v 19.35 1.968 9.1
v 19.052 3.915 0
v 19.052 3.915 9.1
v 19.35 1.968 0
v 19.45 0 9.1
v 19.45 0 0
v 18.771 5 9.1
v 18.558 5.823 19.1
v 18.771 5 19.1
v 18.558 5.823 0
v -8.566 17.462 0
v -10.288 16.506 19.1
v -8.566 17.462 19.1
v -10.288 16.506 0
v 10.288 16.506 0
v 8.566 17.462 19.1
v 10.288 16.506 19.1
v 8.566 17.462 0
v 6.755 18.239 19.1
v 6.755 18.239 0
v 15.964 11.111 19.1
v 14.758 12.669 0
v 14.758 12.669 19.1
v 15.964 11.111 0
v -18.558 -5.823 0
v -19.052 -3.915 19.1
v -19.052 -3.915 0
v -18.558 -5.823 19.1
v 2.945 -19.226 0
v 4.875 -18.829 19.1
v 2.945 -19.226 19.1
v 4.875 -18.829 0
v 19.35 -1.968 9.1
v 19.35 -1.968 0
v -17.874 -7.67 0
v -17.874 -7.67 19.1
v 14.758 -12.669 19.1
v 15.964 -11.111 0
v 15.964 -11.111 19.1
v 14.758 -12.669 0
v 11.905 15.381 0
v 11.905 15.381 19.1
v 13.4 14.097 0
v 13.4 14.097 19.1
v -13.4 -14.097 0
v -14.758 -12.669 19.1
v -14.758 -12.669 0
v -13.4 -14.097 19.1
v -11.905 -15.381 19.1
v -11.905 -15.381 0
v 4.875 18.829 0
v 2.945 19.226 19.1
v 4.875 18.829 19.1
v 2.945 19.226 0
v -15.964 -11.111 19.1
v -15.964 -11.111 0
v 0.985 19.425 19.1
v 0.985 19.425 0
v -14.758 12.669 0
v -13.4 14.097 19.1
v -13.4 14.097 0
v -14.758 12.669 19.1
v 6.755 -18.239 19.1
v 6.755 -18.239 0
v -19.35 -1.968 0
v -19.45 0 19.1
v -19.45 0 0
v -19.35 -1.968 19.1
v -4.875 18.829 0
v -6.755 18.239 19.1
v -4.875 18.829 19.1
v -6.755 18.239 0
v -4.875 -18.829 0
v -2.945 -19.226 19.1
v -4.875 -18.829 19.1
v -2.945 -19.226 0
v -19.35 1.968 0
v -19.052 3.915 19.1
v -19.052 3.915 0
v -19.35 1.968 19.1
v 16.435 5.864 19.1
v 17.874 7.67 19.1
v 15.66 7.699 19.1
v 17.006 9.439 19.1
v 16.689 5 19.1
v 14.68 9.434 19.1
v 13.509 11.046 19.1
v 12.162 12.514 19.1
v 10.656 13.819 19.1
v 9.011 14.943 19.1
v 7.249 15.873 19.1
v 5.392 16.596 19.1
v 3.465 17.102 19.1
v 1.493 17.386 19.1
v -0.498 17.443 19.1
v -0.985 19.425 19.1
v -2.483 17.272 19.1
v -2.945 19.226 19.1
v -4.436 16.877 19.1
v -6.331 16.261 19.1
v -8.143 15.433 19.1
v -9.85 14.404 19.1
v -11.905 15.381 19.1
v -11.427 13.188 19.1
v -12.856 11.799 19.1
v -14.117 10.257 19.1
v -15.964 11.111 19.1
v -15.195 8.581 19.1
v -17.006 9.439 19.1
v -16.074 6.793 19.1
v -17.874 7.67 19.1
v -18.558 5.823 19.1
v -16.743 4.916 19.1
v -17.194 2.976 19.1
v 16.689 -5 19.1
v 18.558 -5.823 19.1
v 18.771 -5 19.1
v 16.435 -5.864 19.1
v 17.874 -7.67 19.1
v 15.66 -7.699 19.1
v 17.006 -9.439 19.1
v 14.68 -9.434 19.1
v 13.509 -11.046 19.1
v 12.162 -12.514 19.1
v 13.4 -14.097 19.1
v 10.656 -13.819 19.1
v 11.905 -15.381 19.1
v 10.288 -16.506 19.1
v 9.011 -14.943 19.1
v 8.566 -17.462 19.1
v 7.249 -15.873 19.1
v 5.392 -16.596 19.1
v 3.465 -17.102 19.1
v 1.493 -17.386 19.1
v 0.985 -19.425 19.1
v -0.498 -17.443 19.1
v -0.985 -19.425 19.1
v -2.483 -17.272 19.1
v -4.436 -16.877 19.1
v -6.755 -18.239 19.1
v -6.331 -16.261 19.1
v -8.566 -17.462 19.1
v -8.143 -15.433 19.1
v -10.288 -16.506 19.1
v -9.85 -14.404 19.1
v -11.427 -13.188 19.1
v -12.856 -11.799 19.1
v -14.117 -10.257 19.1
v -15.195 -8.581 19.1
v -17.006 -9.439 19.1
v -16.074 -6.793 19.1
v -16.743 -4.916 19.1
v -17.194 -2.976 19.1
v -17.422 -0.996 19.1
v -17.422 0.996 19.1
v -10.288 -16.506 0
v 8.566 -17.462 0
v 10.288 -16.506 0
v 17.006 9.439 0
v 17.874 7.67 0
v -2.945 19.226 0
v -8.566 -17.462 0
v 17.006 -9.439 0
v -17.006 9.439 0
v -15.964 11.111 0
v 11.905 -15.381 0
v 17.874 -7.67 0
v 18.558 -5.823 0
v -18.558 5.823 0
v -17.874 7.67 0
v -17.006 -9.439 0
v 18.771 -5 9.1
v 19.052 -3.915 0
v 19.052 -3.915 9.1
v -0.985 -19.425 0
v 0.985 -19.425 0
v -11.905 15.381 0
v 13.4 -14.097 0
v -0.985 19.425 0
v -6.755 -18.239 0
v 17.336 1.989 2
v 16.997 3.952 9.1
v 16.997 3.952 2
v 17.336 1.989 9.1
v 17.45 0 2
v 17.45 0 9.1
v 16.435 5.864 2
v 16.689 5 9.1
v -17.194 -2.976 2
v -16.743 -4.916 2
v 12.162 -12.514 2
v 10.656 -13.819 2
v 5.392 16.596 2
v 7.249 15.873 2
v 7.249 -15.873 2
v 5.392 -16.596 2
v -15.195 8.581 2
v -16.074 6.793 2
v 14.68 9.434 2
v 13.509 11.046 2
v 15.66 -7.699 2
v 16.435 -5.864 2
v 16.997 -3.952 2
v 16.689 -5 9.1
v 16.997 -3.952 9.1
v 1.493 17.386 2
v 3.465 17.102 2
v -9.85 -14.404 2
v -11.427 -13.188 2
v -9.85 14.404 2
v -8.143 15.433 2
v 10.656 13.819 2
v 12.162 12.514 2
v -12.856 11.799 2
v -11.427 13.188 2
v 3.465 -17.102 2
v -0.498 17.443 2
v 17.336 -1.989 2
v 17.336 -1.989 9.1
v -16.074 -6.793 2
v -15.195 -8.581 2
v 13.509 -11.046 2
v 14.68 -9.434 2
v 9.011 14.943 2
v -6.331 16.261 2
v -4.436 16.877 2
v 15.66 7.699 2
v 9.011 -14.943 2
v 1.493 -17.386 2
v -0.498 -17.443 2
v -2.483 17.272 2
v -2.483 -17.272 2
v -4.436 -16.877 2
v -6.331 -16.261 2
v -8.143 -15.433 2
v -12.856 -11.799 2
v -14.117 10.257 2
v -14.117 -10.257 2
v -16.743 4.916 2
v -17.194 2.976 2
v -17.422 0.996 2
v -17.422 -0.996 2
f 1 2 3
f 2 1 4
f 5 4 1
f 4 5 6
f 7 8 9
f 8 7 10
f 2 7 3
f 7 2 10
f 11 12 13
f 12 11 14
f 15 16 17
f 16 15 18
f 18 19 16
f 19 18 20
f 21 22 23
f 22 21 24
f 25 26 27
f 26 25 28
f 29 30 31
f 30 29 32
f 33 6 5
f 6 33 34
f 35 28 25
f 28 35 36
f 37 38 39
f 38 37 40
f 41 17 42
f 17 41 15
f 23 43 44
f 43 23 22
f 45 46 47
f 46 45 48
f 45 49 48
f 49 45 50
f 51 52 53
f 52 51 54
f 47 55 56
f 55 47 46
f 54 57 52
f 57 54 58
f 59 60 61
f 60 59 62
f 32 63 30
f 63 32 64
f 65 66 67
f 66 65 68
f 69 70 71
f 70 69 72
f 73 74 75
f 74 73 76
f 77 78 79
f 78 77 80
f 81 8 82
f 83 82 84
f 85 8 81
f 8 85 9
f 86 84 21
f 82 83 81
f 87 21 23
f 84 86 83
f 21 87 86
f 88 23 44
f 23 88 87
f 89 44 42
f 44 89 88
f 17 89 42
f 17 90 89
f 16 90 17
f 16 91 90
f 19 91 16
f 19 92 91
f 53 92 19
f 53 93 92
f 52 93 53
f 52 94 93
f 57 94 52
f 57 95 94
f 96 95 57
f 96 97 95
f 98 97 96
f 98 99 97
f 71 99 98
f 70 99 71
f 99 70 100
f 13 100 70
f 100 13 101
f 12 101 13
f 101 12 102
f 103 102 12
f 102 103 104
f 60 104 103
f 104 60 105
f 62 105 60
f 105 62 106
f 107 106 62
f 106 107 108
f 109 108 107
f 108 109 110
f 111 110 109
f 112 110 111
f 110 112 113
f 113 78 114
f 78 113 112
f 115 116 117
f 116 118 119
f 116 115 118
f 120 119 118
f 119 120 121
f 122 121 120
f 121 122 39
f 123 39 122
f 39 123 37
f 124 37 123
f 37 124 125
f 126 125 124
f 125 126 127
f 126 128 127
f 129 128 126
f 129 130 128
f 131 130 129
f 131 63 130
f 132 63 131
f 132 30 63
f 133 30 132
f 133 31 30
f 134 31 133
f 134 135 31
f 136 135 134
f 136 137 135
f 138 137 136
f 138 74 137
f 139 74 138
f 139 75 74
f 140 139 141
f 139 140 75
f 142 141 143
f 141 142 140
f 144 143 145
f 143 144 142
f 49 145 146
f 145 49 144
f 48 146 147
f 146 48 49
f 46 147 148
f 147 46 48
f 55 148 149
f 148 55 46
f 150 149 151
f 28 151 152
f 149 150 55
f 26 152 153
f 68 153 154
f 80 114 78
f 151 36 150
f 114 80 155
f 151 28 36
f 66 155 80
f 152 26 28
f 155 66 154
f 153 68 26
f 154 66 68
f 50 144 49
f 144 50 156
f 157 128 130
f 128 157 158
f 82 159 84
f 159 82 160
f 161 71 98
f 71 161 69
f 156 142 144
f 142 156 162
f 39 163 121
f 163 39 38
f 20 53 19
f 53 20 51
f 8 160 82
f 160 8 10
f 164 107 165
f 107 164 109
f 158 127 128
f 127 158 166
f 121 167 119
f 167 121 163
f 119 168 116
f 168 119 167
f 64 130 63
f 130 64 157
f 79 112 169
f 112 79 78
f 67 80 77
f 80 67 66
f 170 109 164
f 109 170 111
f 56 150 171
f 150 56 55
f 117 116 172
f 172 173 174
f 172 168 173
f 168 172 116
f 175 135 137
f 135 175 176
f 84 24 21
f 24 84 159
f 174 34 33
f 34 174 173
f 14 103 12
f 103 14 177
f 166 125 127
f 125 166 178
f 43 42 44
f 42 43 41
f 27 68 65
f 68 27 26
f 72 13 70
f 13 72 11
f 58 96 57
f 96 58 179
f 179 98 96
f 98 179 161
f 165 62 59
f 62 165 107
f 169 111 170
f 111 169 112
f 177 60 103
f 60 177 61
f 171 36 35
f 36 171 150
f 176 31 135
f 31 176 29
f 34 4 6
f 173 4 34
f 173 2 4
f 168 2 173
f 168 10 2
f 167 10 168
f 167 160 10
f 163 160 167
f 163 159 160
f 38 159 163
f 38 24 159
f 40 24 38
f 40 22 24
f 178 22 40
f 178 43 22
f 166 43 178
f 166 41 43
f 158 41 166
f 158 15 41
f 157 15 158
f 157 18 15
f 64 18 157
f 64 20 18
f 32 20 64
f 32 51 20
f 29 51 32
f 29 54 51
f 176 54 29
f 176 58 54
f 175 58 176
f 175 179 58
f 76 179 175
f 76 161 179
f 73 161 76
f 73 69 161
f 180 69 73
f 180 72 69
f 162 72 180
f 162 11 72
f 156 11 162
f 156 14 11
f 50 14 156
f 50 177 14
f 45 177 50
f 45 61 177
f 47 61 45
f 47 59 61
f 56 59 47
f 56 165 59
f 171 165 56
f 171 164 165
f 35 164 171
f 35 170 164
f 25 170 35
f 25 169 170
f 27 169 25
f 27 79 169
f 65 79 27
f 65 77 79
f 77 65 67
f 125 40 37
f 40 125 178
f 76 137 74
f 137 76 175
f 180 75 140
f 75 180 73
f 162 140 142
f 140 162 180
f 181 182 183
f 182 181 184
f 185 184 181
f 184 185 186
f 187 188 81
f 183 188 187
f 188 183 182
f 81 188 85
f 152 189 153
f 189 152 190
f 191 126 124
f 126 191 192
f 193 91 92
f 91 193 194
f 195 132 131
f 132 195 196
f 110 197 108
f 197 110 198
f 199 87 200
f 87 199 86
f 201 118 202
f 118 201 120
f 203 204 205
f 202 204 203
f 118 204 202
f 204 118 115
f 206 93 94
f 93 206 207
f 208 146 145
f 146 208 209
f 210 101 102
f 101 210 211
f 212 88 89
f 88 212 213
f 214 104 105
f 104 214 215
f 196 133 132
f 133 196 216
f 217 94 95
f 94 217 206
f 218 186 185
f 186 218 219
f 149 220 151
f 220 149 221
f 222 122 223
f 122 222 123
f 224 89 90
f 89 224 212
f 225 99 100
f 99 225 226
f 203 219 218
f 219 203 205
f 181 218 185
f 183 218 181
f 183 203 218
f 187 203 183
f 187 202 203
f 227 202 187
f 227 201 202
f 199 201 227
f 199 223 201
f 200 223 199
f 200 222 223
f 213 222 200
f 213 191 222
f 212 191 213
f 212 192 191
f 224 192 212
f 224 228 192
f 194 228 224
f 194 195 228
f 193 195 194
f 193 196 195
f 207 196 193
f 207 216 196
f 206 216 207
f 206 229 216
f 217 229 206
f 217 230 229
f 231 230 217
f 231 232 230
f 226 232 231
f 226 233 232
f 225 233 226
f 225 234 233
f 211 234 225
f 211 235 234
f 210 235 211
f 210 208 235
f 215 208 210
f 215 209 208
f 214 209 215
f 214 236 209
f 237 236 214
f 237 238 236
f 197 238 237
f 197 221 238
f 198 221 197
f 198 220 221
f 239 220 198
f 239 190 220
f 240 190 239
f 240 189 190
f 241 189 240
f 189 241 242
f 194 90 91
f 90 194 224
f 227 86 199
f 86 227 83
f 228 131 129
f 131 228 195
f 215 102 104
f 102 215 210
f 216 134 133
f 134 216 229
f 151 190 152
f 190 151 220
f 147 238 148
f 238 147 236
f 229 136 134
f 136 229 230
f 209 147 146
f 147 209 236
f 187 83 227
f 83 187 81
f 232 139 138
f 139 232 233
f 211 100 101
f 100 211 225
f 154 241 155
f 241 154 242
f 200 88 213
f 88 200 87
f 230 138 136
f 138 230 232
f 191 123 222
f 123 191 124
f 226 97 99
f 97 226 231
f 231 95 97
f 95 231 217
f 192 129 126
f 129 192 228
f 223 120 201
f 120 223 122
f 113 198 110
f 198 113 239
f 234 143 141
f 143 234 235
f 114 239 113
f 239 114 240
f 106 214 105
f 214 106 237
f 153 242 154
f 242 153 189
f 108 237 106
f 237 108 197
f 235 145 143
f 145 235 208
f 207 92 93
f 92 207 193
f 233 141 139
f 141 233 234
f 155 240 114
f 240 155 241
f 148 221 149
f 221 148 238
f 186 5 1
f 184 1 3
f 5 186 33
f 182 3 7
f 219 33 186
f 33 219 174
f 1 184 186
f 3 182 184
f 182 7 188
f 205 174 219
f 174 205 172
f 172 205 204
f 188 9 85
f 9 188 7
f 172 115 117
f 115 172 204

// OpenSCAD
id = 34.9;
h = 19.1;
thickness = 2.0;
notchDepth = 10.0;
$fa = 1;

difference() {
cylinder(r = id / 2.0 + thickness, h = h);
translate([0, 0, thickness])
cylinder(r = id / 2.0, h = h - thickness);
translate([id / 2.0 - thickness * 0.4, -notchDepth / 2.0, h - notchDepth])
cube(size = [thickness * 1.4, notchDepth, notchDepth]);
}
